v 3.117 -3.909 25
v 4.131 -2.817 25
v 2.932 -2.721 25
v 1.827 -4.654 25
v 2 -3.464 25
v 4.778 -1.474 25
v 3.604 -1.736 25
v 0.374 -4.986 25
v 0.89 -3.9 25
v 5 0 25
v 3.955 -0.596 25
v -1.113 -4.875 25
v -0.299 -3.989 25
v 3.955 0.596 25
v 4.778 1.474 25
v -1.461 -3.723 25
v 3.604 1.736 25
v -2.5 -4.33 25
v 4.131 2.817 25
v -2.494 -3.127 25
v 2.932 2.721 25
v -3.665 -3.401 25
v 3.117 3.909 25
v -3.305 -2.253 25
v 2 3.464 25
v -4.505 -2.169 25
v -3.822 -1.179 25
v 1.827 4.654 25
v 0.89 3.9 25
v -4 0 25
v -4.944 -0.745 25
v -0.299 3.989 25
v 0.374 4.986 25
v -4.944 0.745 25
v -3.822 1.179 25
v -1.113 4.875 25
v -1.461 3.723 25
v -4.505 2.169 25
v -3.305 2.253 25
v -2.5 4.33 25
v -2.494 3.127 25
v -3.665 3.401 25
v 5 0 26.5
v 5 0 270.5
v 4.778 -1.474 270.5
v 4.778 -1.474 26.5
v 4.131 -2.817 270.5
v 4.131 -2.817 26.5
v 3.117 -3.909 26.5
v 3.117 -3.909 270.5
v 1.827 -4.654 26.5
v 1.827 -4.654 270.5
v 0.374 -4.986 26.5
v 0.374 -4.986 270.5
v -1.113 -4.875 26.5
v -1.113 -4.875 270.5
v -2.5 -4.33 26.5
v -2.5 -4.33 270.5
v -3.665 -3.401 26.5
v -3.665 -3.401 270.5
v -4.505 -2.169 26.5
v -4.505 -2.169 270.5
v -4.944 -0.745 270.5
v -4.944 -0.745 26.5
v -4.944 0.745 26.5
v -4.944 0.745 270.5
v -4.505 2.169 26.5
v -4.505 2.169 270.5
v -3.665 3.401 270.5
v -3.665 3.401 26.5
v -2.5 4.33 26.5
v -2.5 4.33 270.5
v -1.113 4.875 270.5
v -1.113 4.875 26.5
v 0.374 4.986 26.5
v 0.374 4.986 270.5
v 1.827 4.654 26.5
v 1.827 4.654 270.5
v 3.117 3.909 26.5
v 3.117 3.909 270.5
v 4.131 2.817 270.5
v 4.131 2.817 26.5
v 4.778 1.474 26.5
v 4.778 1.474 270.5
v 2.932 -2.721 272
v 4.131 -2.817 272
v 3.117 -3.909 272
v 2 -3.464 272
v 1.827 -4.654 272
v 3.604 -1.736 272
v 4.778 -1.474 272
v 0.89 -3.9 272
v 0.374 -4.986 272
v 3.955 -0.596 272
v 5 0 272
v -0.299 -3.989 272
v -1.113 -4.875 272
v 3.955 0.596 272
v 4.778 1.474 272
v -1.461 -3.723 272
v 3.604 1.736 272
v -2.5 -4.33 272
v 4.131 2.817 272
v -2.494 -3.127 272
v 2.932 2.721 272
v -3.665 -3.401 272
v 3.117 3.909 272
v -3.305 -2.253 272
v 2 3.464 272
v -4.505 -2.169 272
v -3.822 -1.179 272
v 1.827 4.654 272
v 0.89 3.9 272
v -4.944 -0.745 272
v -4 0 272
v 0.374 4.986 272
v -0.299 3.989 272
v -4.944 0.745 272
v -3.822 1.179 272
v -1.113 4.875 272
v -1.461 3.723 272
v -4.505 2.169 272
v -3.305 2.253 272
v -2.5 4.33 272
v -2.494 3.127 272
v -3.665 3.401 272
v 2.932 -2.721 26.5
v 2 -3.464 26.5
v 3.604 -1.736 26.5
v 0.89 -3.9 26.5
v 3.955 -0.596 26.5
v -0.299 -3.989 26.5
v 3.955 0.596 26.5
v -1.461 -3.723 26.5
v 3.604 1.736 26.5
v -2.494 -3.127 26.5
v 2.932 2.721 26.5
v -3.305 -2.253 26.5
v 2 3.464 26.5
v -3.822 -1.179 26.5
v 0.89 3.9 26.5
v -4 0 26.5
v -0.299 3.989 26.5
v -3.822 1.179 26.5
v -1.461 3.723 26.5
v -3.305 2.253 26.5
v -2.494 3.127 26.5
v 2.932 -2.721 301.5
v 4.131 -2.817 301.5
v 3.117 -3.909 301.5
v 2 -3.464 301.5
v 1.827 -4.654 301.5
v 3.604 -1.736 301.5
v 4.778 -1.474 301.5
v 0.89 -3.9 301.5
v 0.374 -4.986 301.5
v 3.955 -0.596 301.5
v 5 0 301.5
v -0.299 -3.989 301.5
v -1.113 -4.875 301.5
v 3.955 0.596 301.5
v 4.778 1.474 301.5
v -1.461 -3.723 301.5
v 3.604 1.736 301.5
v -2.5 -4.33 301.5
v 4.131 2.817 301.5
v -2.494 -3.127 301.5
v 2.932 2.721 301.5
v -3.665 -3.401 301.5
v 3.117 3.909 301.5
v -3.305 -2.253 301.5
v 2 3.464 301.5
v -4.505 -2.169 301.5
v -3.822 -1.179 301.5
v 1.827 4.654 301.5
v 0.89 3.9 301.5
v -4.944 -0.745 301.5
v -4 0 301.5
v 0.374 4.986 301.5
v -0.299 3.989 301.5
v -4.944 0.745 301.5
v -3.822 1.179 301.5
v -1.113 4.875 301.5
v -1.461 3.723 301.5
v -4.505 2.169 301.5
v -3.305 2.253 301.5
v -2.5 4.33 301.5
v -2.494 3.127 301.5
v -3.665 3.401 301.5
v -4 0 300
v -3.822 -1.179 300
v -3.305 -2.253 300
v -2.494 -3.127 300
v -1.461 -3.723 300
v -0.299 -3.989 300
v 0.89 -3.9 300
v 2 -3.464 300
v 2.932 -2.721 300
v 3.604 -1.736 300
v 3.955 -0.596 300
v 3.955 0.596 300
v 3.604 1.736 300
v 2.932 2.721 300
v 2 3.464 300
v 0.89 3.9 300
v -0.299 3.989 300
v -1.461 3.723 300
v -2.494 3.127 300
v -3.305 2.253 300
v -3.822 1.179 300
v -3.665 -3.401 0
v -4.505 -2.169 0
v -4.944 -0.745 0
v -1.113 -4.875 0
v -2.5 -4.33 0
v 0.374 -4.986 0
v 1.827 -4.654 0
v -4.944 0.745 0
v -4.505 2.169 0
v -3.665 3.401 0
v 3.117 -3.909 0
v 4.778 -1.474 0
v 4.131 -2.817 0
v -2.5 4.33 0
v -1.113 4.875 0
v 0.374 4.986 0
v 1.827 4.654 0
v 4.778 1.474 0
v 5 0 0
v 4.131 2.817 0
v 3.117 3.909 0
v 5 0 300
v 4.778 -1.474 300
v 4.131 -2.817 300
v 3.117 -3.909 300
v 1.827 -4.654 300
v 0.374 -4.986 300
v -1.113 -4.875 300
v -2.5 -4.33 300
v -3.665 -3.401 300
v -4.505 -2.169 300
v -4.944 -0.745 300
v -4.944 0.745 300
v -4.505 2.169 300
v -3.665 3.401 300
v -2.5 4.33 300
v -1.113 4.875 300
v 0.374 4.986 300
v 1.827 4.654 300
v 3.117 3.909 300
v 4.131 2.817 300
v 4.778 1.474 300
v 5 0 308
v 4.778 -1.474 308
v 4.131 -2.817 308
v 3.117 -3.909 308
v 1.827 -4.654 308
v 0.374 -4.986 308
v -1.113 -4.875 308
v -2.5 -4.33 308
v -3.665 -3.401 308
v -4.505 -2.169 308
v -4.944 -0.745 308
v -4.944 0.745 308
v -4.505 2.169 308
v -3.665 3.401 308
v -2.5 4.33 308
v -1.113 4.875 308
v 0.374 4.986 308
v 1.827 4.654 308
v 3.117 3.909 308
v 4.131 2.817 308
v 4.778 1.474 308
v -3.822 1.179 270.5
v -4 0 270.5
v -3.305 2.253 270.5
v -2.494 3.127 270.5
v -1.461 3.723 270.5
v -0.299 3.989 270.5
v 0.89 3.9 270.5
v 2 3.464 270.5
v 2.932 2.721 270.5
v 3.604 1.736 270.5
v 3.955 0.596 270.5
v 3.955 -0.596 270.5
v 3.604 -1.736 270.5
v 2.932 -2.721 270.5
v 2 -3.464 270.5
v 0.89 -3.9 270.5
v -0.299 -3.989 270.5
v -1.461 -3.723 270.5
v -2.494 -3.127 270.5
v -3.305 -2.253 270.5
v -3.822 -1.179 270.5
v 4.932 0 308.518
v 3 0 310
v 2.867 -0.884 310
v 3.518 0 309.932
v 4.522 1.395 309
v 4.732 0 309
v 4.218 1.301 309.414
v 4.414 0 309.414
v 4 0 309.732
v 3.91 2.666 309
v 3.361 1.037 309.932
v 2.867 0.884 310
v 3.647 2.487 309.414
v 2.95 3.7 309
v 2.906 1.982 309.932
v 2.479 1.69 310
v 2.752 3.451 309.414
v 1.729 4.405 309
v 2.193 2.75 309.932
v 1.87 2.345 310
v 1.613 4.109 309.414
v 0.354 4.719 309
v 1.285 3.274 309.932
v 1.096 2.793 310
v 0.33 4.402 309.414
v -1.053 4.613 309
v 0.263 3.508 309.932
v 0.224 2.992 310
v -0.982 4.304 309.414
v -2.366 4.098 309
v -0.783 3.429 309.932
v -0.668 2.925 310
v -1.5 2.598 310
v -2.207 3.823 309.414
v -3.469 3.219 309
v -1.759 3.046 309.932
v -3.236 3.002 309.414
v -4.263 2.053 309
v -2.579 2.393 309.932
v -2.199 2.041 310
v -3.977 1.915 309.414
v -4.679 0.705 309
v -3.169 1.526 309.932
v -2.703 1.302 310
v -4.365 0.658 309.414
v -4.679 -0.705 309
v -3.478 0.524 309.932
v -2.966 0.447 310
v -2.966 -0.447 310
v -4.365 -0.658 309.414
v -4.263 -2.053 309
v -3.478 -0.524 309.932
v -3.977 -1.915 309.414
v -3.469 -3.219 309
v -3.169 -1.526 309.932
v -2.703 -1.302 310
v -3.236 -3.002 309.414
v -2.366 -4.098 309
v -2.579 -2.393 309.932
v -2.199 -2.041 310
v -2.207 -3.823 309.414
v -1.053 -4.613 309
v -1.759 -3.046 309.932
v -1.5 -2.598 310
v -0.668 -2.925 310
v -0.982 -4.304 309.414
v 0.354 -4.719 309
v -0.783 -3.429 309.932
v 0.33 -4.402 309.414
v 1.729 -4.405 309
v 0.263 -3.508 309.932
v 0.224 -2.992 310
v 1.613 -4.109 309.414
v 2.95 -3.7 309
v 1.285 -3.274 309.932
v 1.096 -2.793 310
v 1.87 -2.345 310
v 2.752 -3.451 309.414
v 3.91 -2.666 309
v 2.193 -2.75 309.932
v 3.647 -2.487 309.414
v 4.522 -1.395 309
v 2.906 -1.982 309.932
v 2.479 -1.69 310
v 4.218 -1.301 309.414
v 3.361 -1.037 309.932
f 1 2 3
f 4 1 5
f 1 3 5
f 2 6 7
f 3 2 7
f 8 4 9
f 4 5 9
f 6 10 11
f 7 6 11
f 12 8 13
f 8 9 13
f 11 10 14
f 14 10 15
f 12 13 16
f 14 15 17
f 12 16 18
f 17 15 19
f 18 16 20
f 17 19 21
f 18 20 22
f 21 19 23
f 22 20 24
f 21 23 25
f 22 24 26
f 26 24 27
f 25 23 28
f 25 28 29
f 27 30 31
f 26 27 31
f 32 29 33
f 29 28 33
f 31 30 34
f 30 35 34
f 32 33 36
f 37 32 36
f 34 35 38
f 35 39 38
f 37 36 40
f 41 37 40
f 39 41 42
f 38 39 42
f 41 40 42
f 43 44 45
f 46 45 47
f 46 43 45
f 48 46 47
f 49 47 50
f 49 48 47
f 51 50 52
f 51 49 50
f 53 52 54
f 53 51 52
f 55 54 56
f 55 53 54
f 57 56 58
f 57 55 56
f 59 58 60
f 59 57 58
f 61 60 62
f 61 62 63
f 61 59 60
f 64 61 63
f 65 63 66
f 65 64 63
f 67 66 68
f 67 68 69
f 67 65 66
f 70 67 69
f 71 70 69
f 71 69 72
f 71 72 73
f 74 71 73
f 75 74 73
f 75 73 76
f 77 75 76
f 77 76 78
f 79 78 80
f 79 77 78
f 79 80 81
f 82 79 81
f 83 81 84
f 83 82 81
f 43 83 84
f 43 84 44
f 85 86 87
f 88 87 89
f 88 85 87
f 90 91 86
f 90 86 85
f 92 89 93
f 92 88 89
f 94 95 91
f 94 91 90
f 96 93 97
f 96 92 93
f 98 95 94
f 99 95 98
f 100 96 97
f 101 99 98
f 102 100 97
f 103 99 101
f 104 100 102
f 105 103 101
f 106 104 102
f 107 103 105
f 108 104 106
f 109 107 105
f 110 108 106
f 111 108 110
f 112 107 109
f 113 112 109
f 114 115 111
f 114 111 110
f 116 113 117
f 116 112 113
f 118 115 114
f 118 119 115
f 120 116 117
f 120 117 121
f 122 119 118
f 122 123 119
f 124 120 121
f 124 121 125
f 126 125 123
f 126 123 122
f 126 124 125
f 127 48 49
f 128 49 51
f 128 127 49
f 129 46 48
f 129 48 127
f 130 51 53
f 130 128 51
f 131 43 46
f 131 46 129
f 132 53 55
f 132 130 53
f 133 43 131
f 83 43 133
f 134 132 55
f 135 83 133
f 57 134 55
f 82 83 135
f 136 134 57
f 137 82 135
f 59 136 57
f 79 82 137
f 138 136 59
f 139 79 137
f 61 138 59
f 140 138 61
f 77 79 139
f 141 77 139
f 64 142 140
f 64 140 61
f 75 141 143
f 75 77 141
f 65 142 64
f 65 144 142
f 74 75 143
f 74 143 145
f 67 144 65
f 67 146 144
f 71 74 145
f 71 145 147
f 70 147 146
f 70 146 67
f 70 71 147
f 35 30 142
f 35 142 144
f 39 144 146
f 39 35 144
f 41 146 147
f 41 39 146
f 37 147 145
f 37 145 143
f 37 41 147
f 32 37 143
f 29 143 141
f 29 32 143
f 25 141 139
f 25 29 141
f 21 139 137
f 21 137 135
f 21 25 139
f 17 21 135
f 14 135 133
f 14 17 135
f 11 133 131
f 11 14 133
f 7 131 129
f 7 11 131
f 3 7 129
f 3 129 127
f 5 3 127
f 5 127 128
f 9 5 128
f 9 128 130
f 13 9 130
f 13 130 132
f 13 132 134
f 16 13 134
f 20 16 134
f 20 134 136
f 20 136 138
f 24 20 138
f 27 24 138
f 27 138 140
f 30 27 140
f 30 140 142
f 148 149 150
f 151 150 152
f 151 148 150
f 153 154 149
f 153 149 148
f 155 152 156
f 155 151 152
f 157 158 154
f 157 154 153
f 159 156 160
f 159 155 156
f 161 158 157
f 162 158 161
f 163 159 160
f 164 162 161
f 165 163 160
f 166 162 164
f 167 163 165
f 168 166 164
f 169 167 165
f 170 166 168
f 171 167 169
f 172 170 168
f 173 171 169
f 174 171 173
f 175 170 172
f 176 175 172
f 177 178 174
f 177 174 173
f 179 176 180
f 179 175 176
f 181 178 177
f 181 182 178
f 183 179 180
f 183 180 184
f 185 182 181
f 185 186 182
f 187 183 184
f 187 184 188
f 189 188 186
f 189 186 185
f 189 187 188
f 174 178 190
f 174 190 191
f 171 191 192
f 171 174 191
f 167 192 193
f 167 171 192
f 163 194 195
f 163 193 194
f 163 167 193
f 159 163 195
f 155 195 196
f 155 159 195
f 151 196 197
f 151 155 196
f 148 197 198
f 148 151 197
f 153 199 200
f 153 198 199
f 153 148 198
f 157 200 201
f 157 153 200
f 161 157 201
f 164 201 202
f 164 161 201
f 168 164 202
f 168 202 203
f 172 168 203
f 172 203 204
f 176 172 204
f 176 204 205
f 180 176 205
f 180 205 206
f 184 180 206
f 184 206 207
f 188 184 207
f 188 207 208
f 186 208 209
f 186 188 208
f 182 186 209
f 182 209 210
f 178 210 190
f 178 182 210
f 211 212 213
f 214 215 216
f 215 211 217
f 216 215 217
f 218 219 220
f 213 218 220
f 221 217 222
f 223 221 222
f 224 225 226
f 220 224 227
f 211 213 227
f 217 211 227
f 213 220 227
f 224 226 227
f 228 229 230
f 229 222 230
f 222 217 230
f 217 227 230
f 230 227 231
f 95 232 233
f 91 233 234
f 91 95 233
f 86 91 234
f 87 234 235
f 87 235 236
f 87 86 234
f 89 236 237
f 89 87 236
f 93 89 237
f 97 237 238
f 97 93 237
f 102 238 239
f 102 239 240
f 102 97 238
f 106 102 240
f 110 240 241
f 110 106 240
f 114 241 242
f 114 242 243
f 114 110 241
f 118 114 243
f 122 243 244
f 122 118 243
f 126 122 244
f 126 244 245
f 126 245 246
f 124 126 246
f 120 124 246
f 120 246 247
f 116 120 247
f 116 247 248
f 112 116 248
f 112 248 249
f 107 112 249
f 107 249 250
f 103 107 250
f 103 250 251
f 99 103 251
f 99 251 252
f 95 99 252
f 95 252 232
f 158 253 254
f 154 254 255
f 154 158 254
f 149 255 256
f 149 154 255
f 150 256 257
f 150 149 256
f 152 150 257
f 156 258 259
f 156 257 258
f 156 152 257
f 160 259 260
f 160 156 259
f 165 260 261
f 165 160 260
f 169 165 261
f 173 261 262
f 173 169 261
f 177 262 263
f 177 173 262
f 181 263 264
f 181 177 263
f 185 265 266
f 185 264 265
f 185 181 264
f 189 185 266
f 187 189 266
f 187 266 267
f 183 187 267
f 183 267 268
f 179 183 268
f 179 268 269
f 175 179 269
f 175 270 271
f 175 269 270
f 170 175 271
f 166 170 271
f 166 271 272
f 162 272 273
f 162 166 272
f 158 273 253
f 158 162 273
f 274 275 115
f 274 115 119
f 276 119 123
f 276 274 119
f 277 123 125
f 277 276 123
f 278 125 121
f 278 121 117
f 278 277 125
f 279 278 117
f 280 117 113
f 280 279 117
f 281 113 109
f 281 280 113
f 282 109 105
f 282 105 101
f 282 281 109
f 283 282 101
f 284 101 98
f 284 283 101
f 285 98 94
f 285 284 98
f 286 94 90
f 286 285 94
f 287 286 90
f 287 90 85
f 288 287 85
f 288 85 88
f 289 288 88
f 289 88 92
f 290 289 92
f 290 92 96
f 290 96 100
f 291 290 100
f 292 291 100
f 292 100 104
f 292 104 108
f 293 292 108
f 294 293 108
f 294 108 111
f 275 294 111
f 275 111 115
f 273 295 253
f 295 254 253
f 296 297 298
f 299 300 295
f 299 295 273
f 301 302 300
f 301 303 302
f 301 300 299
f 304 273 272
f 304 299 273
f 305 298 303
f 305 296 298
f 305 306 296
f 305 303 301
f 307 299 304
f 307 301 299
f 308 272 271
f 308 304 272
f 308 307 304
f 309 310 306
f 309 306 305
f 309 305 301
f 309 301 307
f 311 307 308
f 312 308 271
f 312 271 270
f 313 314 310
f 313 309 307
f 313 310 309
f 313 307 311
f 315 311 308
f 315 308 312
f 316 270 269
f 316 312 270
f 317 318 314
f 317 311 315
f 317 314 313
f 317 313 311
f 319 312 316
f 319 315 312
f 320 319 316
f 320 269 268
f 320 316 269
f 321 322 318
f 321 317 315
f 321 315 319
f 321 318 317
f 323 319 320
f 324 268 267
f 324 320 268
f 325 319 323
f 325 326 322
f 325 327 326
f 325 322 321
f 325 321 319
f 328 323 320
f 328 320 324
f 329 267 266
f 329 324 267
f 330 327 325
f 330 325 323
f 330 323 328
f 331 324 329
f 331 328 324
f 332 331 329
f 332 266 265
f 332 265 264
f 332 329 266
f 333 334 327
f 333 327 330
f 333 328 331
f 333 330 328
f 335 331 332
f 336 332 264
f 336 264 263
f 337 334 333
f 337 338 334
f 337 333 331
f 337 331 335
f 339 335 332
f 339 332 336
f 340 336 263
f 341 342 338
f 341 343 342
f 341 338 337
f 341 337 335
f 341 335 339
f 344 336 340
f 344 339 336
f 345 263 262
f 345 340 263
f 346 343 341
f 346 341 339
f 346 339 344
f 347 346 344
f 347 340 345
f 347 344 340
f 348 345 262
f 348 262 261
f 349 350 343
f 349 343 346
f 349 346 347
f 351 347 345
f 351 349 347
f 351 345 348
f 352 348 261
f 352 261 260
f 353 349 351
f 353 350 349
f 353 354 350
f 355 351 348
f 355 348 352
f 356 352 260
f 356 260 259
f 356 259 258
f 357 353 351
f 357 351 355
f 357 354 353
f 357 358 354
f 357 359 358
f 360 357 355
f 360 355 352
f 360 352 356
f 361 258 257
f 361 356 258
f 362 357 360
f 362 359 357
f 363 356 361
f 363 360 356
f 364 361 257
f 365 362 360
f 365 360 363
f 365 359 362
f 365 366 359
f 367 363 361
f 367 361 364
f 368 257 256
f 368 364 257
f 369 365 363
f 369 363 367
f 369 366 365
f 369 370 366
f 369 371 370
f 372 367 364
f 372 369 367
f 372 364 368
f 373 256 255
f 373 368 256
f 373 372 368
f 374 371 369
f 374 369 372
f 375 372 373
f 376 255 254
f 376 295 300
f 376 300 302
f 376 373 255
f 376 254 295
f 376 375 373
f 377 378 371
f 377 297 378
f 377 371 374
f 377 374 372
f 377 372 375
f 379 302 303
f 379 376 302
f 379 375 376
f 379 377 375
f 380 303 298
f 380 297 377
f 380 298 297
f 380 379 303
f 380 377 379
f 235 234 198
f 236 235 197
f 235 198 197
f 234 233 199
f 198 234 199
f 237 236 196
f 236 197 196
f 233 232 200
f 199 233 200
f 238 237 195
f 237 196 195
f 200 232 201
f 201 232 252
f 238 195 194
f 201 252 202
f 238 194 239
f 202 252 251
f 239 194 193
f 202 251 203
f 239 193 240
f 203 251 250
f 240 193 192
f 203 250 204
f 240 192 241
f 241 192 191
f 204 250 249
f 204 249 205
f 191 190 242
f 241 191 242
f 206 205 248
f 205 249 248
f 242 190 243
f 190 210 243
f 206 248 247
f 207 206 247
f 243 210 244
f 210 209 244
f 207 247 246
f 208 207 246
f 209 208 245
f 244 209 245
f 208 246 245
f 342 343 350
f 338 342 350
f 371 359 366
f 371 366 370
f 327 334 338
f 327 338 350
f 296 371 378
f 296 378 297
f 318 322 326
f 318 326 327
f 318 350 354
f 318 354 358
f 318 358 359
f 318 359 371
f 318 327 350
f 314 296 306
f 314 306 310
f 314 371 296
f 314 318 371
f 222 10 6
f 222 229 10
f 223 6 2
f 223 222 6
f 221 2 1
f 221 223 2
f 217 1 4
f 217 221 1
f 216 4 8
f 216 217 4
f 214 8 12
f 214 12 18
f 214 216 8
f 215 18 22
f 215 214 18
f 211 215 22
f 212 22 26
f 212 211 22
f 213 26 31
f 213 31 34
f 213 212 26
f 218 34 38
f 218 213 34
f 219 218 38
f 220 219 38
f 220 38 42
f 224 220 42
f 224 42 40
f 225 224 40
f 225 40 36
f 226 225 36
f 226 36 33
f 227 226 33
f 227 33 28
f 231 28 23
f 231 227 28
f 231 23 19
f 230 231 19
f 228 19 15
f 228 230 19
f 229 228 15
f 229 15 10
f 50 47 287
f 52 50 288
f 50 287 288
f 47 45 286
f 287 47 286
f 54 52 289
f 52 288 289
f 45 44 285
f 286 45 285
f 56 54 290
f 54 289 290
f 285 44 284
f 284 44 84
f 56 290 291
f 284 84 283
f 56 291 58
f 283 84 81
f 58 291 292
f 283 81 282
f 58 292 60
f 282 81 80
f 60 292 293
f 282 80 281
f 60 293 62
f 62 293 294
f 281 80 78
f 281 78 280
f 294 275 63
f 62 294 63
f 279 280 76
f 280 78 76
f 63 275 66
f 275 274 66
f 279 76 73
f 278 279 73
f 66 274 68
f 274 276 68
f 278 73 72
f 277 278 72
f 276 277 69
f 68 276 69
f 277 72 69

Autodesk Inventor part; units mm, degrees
ref_plane "YZ Plane" through (0, 0, 0) normal (1, 0, 0) x (0, 1, 0)
ref_plane "XZ Plane" through (0, 0, 0) normal (0, 1, 0) x (-1, 0, 0)
ref_plane "XY Plane" through (0, 0, 0) normal (0, 0, 1) x (1, 0, 0)
sketch "Boceto1" plane through (0, 0, 0) normal (0, 0, 1) x (1, 0, 0)
  circle A0 centre (0, 0) radius 5
  dimension "d0" = 5
extrude "Extrusión1" add sketch "Boceto1" along normal blind 310
thread "Rosca1" size "M10x1.5" class "6g" standard "ANSI Metric M Profile" length 20
fillet "Empalme1" radius 2 1 edges at (-5, 0, 310)
sketch "Boceto2" plane through (0, 0, 0) normal (0, 1, 0) x (-1, 0, 0)
  line L0 (-3, 310) -> (3, 310) construction
  line L1 (0, 310) -> (0, 0) construction
  line L2 (-5, 0) -> (-5, 308) construction
  line L3 (5, 0) -> (5, 308) projected
  line L4 (5, 300) -> (4, 300)
  line L5 (4, 300) -> (4, 301.5)
  line L6 (4, 301.5) -> (5, 301.5)
  line L7 (5, 301.5) -> (5, 300)
  line L8 (5, 0) -> (5, 308) projected
  line L9 (5, 26.5) -> (4, 26.5)
  line L10 (4, 26.5) -> (4, 25)
  line L11 (4, 25) -> (5, 25)
  line L12 (5, 25) -> (5, 26.5)
  line L13 (-5, 0) -> (5, 0) projected
  line L14 (5, 272) -> (4, 272)
  line L15 (4, 272) -> (4, 270.5)
  line L16 (4, 270.5) -> (5, 270.5)
  line L17 (5, 270.5) -> (5, 272)
  dimension "d6" = 1.5
  dimension "d7" = 1
  dimension "d9" = 10
  dimension "d11" = 25
  dimension "d12" = 1.5
  dimension "d13" = 1
  dimension "d14" = 1.5
  dimension "d15" = 1
  dimension "d16" = 39.5
revolve "Revolución1" cut sketch "Boceto2" angle 360 about axis through (0, 0, 310) along (0, 0, -1)
properties part number "vailla enroscada" material "Acetal Resin, Black"
